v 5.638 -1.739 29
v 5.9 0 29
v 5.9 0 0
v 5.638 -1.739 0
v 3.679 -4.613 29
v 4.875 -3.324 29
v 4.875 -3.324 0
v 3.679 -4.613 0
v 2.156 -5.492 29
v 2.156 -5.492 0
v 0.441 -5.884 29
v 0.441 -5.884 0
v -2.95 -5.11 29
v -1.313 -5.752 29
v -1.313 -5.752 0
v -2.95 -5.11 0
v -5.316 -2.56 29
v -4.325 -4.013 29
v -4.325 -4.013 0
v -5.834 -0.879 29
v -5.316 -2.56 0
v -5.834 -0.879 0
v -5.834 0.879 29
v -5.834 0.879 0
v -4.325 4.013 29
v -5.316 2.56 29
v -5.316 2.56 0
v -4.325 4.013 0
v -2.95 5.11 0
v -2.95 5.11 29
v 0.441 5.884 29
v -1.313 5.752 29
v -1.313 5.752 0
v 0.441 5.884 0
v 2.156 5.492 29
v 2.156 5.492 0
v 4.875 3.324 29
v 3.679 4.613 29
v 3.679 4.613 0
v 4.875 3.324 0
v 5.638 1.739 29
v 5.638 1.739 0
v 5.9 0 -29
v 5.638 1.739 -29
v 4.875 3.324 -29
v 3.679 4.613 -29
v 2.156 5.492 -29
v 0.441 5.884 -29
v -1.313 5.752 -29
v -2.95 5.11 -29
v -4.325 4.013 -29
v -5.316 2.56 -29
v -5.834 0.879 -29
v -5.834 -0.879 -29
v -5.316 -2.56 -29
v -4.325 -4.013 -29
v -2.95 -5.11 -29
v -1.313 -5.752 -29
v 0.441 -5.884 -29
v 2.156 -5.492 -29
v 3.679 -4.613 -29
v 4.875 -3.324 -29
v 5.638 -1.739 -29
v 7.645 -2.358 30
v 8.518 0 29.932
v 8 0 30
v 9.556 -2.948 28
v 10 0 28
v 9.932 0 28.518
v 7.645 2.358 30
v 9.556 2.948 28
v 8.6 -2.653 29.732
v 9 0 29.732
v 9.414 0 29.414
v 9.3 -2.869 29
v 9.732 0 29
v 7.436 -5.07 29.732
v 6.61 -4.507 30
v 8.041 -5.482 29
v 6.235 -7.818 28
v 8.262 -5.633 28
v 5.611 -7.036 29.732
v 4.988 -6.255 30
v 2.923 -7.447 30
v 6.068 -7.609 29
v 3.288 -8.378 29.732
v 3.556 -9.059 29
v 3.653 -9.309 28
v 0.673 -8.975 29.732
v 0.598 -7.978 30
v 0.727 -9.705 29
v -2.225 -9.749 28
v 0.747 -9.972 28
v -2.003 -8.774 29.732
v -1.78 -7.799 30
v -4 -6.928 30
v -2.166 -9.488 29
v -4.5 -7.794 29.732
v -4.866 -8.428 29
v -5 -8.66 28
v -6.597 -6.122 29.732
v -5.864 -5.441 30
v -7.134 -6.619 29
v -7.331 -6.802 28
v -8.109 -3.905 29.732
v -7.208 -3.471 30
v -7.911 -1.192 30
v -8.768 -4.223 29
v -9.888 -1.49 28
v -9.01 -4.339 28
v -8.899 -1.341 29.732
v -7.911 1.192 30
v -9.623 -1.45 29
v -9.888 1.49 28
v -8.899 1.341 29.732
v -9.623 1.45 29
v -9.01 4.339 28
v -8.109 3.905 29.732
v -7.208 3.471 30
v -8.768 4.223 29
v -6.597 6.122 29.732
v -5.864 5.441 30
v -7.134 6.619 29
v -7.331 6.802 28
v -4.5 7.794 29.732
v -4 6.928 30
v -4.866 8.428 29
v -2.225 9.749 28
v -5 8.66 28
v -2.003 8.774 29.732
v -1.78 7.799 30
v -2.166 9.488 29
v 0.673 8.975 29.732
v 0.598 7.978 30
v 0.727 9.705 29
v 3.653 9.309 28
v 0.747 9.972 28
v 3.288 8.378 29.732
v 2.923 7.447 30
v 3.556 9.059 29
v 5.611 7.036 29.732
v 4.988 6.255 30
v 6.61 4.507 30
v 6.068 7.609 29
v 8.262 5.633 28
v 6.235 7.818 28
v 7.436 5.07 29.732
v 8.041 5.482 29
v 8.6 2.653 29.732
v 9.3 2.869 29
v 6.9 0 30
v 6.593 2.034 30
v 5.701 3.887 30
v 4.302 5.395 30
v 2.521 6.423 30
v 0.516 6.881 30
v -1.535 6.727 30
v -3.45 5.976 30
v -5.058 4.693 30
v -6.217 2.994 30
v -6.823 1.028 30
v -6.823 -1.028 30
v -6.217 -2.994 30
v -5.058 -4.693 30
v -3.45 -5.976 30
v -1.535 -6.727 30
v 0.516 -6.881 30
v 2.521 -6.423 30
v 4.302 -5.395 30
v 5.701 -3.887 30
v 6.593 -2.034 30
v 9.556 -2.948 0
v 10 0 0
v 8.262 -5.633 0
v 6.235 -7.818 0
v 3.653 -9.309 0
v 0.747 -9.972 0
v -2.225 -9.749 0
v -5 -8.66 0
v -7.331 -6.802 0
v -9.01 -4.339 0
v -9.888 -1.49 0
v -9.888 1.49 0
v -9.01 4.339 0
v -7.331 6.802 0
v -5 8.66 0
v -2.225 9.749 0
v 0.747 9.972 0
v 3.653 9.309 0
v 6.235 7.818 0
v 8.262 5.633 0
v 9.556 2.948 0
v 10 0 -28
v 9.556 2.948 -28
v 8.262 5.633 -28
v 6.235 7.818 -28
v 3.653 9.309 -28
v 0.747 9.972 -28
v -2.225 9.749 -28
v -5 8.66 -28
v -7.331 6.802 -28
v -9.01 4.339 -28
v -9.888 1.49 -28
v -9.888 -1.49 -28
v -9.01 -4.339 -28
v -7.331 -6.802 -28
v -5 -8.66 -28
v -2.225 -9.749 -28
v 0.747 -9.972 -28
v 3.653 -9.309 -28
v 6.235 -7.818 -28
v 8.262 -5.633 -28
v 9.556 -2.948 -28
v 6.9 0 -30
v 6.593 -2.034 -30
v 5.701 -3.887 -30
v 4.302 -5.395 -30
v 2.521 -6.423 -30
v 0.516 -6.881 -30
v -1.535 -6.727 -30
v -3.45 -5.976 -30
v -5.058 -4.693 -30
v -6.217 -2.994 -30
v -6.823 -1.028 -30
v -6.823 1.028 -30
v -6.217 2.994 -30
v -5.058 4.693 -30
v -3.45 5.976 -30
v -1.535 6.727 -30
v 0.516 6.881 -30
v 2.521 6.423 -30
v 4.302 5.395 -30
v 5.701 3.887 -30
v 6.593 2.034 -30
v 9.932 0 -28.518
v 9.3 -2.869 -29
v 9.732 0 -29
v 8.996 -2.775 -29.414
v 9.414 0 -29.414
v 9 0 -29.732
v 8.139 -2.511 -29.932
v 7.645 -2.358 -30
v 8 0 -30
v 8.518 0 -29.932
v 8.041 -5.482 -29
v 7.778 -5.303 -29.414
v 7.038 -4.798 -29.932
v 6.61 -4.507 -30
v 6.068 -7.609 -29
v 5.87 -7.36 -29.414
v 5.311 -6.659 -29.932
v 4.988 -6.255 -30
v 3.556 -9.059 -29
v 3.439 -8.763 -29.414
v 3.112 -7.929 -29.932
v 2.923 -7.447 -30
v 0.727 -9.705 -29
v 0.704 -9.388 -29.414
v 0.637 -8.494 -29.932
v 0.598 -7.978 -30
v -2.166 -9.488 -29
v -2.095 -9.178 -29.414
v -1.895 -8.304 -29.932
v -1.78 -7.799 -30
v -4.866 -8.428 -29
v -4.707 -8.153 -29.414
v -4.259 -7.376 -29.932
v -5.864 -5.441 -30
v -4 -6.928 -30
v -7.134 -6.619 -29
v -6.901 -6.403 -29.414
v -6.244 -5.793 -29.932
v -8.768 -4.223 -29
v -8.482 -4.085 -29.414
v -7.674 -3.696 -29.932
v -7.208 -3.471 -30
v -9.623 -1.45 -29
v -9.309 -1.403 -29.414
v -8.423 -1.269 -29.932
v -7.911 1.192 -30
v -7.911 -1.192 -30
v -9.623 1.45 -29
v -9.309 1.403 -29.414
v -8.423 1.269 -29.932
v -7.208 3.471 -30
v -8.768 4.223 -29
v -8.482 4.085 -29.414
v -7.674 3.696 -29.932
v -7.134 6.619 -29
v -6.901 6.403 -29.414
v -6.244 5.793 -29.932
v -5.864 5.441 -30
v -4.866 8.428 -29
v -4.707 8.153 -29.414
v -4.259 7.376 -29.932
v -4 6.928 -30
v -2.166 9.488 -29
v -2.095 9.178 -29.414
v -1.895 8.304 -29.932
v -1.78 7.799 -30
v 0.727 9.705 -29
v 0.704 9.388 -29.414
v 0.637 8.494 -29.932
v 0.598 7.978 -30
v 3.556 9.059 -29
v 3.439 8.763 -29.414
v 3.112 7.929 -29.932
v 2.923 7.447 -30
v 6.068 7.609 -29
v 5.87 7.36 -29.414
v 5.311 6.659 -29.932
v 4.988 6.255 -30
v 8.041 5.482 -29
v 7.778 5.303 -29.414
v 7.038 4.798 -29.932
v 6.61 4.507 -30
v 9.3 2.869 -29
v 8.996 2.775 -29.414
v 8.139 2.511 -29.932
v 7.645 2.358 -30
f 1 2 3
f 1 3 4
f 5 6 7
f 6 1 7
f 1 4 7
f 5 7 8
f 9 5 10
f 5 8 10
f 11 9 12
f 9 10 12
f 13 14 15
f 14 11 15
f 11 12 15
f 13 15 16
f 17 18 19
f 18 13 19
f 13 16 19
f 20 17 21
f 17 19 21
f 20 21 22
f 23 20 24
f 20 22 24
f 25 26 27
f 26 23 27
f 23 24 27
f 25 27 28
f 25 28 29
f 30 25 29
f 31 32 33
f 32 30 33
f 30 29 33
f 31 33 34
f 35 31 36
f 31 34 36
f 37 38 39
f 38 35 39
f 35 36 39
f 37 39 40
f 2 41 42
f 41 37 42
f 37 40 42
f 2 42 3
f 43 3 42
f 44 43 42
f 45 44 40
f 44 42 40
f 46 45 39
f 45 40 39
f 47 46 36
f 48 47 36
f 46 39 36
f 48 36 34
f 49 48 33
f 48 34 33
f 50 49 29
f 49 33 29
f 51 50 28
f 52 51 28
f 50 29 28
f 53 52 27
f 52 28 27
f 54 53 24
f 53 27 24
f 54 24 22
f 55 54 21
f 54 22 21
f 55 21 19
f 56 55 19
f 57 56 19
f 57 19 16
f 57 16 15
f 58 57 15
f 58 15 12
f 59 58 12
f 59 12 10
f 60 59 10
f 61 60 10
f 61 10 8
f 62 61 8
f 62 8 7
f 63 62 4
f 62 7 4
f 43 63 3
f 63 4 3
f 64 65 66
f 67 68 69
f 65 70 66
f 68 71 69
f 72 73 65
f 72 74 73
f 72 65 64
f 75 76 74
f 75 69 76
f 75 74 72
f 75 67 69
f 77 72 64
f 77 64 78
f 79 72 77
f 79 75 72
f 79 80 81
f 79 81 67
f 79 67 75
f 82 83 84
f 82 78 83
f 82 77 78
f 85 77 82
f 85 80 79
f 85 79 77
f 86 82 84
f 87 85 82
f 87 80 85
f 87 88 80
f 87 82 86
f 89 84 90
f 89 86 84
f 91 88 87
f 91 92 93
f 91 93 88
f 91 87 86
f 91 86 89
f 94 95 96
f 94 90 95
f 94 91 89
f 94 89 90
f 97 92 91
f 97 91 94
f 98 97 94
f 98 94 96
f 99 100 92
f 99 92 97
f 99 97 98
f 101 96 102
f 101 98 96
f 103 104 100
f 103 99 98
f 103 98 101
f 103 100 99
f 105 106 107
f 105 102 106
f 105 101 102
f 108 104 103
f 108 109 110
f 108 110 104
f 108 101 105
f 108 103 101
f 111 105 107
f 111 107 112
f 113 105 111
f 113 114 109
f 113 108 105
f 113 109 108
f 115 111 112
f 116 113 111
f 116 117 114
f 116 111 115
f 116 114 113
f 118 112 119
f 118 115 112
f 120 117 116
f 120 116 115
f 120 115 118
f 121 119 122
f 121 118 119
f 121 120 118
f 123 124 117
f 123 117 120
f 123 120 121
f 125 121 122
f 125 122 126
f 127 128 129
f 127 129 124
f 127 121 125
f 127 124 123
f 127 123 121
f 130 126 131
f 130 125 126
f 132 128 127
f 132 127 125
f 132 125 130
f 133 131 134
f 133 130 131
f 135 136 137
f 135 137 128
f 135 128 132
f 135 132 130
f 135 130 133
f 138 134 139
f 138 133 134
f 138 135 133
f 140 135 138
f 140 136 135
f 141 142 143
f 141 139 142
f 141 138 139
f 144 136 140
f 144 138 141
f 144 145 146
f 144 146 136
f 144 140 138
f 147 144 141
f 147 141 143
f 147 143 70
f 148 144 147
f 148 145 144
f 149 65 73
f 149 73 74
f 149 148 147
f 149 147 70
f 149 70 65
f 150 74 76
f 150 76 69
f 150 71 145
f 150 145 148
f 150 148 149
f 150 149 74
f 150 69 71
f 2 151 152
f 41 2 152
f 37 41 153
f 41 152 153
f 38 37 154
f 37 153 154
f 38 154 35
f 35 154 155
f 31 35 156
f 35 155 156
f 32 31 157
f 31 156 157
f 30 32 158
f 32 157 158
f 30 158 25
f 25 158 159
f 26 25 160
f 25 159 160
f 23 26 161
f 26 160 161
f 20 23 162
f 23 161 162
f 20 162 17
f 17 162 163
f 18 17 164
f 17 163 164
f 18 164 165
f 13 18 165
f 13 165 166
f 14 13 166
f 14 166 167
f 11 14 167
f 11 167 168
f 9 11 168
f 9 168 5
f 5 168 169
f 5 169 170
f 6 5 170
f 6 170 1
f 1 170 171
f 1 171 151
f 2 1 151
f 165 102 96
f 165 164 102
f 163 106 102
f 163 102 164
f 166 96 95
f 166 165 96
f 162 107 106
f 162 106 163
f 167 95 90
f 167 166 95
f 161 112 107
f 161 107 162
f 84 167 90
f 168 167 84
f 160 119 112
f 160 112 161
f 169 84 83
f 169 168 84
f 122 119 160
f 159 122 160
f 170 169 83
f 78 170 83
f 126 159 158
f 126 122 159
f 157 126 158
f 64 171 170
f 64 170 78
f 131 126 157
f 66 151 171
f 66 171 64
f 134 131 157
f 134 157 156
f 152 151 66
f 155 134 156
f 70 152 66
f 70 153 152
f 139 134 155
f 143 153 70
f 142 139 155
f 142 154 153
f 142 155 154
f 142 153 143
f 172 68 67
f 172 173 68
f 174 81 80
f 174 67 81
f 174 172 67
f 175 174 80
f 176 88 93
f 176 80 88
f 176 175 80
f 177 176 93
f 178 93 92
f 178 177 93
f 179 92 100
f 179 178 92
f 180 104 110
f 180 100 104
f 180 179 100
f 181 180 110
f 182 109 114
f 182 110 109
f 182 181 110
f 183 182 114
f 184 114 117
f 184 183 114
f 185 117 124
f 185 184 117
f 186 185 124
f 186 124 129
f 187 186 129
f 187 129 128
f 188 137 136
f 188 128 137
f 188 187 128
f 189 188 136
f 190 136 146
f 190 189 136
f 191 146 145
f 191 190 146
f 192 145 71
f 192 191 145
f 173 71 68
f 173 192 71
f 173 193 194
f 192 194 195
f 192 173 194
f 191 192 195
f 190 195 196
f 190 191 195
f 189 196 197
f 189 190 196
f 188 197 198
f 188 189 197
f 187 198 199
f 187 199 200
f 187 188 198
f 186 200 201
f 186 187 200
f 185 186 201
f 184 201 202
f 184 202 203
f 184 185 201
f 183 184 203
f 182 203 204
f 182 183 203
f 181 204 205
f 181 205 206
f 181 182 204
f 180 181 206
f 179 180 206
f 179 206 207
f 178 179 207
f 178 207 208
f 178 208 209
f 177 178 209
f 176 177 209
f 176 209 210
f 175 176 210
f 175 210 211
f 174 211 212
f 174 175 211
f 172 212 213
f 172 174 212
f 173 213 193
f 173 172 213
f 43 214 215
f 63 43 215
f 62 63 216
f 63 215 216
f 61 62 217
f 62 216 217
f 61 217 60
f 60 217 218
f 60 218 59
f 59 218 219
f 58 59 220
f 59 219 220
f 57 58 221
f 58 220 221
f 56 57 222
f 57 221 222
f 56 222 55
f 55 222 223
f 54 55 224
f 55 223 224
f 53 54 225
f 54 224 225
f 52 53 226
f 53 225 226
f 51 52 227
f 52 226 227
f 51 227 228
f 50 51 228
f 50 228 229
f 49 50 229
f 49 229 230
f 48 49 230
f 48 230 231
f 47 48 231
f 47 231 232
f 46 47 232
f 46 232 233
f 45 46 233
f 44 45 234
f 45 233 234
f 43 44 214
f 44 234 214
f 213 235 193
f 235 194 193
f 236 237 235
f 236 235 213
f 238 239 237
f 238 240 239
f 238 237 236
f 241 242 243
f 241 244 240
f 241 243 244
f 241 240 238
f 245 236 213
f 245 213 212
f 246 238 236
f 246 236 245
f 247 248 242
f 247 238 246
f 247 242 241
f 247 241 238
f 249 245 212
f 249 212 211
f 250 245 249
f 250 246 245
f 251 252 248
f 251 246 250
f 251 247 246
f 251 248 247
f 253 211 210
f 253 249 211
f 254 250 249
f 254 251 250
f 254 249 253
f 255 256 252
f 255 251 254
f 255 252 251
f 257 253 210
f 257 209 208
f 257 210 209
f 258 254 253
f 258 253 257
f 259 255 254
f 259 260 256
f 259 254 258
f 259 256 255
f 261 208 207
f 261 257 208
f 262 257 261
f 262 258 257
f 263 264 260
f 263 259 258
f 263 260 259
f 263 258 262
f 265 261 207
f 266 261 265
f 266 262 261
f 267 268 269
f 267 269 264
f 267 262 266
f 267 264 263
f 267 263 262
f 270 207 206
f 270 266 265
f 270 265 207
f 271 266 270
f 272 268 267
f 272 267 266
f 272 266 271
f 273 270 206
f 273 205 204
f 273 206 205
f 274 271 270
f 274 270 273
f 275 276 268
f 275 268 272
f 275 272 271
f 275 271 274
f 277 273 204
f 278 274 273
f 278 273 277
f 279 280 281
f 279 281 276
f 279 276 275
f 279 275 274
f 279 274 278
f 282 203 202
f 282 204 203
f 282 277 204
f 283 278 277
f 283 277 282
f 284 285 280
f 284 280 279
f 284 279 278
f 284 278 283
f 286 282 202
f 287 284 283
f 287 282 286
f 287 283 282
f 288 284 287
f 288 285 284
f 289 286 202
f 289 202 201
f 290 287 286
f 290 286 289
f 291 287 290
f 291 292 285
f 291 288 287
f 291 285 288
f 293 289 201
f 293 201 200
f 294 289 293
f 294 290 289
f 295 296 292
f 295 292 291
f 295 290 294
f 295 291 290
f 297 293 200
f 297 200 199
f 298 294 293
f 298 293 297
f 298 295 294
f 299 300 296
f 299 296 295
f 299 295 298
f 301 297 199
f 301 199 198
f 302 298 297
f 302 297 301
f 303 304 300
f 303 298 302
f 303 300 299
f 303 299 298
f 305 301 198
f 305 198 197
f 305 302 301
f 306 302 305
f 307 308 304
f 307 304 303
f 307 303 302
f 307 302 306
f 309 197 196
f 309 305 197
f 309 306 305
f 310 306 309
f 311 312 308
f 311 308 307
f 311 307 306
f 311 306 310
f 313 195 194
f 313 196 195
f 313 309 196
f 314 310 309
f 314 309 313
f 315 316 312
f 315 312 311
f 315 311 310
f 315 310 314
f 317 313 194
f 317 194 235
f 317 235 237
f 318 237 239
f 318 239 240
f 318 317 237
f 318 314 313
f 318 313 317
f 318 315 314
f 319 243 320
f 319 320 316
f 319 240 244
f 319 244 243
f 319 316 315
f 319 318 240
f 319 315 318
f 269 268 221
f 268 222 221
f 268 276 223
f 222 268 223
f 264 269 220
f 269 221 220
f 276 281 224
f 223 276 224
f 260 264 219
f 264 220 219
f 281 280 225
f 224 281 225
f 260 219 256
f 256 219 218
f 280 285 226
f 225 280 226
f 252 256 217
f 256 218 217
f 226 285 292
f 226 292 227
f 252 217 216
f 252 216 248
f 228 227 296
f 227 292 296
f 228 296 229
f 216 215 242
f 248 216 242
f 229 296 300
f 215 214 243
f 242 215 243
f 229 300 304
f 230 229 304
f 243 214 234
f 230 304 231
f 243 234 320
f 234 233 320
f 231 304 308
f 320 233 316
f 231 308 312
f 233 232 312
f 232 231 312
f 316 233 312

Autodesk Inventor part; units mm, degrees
ref_plane "YZ Plane" through (0, 0, 0) normal (1, 0, 0) x (0, 1, 0)
ref_plane "XZ Plane" through (0, 0, 0) normal (0, 1, 0) x (-1, 0, 0)
ref_plane "XY Plane" through (0, 0, 0) normal (0, 0, 1) x (1, 0, 0)
sketch "Sketch1" plane through (0, 0, 0) normal (0, 0, 1) x (1, 0, 0)
  circle A0 centre (0, 0) radius 5.9
  circle A1 centre (0, 0) radius 10
  dimension "d0" = 11.8
  dimension "d1" = 20
extrude "Extrusion1" add sketch "Sketch1" along normal mid plane 60
thread "Thread1" size "G 1/4-19" standard "BSP Pipe Threads" length 10
thread "Thread2" size "G 1/4-19" standard "BSP Pipe Threads" length 10
chamfer "Chamfer1" distance 1 angle 45 2 edges at (-5.9, 0, 30) (-5.9, 0, -30)
fillet "Fillet1" radius 2 2 edges at (-10, 0, -30) (-10, 0, 30)
properties part number "Plenum"
